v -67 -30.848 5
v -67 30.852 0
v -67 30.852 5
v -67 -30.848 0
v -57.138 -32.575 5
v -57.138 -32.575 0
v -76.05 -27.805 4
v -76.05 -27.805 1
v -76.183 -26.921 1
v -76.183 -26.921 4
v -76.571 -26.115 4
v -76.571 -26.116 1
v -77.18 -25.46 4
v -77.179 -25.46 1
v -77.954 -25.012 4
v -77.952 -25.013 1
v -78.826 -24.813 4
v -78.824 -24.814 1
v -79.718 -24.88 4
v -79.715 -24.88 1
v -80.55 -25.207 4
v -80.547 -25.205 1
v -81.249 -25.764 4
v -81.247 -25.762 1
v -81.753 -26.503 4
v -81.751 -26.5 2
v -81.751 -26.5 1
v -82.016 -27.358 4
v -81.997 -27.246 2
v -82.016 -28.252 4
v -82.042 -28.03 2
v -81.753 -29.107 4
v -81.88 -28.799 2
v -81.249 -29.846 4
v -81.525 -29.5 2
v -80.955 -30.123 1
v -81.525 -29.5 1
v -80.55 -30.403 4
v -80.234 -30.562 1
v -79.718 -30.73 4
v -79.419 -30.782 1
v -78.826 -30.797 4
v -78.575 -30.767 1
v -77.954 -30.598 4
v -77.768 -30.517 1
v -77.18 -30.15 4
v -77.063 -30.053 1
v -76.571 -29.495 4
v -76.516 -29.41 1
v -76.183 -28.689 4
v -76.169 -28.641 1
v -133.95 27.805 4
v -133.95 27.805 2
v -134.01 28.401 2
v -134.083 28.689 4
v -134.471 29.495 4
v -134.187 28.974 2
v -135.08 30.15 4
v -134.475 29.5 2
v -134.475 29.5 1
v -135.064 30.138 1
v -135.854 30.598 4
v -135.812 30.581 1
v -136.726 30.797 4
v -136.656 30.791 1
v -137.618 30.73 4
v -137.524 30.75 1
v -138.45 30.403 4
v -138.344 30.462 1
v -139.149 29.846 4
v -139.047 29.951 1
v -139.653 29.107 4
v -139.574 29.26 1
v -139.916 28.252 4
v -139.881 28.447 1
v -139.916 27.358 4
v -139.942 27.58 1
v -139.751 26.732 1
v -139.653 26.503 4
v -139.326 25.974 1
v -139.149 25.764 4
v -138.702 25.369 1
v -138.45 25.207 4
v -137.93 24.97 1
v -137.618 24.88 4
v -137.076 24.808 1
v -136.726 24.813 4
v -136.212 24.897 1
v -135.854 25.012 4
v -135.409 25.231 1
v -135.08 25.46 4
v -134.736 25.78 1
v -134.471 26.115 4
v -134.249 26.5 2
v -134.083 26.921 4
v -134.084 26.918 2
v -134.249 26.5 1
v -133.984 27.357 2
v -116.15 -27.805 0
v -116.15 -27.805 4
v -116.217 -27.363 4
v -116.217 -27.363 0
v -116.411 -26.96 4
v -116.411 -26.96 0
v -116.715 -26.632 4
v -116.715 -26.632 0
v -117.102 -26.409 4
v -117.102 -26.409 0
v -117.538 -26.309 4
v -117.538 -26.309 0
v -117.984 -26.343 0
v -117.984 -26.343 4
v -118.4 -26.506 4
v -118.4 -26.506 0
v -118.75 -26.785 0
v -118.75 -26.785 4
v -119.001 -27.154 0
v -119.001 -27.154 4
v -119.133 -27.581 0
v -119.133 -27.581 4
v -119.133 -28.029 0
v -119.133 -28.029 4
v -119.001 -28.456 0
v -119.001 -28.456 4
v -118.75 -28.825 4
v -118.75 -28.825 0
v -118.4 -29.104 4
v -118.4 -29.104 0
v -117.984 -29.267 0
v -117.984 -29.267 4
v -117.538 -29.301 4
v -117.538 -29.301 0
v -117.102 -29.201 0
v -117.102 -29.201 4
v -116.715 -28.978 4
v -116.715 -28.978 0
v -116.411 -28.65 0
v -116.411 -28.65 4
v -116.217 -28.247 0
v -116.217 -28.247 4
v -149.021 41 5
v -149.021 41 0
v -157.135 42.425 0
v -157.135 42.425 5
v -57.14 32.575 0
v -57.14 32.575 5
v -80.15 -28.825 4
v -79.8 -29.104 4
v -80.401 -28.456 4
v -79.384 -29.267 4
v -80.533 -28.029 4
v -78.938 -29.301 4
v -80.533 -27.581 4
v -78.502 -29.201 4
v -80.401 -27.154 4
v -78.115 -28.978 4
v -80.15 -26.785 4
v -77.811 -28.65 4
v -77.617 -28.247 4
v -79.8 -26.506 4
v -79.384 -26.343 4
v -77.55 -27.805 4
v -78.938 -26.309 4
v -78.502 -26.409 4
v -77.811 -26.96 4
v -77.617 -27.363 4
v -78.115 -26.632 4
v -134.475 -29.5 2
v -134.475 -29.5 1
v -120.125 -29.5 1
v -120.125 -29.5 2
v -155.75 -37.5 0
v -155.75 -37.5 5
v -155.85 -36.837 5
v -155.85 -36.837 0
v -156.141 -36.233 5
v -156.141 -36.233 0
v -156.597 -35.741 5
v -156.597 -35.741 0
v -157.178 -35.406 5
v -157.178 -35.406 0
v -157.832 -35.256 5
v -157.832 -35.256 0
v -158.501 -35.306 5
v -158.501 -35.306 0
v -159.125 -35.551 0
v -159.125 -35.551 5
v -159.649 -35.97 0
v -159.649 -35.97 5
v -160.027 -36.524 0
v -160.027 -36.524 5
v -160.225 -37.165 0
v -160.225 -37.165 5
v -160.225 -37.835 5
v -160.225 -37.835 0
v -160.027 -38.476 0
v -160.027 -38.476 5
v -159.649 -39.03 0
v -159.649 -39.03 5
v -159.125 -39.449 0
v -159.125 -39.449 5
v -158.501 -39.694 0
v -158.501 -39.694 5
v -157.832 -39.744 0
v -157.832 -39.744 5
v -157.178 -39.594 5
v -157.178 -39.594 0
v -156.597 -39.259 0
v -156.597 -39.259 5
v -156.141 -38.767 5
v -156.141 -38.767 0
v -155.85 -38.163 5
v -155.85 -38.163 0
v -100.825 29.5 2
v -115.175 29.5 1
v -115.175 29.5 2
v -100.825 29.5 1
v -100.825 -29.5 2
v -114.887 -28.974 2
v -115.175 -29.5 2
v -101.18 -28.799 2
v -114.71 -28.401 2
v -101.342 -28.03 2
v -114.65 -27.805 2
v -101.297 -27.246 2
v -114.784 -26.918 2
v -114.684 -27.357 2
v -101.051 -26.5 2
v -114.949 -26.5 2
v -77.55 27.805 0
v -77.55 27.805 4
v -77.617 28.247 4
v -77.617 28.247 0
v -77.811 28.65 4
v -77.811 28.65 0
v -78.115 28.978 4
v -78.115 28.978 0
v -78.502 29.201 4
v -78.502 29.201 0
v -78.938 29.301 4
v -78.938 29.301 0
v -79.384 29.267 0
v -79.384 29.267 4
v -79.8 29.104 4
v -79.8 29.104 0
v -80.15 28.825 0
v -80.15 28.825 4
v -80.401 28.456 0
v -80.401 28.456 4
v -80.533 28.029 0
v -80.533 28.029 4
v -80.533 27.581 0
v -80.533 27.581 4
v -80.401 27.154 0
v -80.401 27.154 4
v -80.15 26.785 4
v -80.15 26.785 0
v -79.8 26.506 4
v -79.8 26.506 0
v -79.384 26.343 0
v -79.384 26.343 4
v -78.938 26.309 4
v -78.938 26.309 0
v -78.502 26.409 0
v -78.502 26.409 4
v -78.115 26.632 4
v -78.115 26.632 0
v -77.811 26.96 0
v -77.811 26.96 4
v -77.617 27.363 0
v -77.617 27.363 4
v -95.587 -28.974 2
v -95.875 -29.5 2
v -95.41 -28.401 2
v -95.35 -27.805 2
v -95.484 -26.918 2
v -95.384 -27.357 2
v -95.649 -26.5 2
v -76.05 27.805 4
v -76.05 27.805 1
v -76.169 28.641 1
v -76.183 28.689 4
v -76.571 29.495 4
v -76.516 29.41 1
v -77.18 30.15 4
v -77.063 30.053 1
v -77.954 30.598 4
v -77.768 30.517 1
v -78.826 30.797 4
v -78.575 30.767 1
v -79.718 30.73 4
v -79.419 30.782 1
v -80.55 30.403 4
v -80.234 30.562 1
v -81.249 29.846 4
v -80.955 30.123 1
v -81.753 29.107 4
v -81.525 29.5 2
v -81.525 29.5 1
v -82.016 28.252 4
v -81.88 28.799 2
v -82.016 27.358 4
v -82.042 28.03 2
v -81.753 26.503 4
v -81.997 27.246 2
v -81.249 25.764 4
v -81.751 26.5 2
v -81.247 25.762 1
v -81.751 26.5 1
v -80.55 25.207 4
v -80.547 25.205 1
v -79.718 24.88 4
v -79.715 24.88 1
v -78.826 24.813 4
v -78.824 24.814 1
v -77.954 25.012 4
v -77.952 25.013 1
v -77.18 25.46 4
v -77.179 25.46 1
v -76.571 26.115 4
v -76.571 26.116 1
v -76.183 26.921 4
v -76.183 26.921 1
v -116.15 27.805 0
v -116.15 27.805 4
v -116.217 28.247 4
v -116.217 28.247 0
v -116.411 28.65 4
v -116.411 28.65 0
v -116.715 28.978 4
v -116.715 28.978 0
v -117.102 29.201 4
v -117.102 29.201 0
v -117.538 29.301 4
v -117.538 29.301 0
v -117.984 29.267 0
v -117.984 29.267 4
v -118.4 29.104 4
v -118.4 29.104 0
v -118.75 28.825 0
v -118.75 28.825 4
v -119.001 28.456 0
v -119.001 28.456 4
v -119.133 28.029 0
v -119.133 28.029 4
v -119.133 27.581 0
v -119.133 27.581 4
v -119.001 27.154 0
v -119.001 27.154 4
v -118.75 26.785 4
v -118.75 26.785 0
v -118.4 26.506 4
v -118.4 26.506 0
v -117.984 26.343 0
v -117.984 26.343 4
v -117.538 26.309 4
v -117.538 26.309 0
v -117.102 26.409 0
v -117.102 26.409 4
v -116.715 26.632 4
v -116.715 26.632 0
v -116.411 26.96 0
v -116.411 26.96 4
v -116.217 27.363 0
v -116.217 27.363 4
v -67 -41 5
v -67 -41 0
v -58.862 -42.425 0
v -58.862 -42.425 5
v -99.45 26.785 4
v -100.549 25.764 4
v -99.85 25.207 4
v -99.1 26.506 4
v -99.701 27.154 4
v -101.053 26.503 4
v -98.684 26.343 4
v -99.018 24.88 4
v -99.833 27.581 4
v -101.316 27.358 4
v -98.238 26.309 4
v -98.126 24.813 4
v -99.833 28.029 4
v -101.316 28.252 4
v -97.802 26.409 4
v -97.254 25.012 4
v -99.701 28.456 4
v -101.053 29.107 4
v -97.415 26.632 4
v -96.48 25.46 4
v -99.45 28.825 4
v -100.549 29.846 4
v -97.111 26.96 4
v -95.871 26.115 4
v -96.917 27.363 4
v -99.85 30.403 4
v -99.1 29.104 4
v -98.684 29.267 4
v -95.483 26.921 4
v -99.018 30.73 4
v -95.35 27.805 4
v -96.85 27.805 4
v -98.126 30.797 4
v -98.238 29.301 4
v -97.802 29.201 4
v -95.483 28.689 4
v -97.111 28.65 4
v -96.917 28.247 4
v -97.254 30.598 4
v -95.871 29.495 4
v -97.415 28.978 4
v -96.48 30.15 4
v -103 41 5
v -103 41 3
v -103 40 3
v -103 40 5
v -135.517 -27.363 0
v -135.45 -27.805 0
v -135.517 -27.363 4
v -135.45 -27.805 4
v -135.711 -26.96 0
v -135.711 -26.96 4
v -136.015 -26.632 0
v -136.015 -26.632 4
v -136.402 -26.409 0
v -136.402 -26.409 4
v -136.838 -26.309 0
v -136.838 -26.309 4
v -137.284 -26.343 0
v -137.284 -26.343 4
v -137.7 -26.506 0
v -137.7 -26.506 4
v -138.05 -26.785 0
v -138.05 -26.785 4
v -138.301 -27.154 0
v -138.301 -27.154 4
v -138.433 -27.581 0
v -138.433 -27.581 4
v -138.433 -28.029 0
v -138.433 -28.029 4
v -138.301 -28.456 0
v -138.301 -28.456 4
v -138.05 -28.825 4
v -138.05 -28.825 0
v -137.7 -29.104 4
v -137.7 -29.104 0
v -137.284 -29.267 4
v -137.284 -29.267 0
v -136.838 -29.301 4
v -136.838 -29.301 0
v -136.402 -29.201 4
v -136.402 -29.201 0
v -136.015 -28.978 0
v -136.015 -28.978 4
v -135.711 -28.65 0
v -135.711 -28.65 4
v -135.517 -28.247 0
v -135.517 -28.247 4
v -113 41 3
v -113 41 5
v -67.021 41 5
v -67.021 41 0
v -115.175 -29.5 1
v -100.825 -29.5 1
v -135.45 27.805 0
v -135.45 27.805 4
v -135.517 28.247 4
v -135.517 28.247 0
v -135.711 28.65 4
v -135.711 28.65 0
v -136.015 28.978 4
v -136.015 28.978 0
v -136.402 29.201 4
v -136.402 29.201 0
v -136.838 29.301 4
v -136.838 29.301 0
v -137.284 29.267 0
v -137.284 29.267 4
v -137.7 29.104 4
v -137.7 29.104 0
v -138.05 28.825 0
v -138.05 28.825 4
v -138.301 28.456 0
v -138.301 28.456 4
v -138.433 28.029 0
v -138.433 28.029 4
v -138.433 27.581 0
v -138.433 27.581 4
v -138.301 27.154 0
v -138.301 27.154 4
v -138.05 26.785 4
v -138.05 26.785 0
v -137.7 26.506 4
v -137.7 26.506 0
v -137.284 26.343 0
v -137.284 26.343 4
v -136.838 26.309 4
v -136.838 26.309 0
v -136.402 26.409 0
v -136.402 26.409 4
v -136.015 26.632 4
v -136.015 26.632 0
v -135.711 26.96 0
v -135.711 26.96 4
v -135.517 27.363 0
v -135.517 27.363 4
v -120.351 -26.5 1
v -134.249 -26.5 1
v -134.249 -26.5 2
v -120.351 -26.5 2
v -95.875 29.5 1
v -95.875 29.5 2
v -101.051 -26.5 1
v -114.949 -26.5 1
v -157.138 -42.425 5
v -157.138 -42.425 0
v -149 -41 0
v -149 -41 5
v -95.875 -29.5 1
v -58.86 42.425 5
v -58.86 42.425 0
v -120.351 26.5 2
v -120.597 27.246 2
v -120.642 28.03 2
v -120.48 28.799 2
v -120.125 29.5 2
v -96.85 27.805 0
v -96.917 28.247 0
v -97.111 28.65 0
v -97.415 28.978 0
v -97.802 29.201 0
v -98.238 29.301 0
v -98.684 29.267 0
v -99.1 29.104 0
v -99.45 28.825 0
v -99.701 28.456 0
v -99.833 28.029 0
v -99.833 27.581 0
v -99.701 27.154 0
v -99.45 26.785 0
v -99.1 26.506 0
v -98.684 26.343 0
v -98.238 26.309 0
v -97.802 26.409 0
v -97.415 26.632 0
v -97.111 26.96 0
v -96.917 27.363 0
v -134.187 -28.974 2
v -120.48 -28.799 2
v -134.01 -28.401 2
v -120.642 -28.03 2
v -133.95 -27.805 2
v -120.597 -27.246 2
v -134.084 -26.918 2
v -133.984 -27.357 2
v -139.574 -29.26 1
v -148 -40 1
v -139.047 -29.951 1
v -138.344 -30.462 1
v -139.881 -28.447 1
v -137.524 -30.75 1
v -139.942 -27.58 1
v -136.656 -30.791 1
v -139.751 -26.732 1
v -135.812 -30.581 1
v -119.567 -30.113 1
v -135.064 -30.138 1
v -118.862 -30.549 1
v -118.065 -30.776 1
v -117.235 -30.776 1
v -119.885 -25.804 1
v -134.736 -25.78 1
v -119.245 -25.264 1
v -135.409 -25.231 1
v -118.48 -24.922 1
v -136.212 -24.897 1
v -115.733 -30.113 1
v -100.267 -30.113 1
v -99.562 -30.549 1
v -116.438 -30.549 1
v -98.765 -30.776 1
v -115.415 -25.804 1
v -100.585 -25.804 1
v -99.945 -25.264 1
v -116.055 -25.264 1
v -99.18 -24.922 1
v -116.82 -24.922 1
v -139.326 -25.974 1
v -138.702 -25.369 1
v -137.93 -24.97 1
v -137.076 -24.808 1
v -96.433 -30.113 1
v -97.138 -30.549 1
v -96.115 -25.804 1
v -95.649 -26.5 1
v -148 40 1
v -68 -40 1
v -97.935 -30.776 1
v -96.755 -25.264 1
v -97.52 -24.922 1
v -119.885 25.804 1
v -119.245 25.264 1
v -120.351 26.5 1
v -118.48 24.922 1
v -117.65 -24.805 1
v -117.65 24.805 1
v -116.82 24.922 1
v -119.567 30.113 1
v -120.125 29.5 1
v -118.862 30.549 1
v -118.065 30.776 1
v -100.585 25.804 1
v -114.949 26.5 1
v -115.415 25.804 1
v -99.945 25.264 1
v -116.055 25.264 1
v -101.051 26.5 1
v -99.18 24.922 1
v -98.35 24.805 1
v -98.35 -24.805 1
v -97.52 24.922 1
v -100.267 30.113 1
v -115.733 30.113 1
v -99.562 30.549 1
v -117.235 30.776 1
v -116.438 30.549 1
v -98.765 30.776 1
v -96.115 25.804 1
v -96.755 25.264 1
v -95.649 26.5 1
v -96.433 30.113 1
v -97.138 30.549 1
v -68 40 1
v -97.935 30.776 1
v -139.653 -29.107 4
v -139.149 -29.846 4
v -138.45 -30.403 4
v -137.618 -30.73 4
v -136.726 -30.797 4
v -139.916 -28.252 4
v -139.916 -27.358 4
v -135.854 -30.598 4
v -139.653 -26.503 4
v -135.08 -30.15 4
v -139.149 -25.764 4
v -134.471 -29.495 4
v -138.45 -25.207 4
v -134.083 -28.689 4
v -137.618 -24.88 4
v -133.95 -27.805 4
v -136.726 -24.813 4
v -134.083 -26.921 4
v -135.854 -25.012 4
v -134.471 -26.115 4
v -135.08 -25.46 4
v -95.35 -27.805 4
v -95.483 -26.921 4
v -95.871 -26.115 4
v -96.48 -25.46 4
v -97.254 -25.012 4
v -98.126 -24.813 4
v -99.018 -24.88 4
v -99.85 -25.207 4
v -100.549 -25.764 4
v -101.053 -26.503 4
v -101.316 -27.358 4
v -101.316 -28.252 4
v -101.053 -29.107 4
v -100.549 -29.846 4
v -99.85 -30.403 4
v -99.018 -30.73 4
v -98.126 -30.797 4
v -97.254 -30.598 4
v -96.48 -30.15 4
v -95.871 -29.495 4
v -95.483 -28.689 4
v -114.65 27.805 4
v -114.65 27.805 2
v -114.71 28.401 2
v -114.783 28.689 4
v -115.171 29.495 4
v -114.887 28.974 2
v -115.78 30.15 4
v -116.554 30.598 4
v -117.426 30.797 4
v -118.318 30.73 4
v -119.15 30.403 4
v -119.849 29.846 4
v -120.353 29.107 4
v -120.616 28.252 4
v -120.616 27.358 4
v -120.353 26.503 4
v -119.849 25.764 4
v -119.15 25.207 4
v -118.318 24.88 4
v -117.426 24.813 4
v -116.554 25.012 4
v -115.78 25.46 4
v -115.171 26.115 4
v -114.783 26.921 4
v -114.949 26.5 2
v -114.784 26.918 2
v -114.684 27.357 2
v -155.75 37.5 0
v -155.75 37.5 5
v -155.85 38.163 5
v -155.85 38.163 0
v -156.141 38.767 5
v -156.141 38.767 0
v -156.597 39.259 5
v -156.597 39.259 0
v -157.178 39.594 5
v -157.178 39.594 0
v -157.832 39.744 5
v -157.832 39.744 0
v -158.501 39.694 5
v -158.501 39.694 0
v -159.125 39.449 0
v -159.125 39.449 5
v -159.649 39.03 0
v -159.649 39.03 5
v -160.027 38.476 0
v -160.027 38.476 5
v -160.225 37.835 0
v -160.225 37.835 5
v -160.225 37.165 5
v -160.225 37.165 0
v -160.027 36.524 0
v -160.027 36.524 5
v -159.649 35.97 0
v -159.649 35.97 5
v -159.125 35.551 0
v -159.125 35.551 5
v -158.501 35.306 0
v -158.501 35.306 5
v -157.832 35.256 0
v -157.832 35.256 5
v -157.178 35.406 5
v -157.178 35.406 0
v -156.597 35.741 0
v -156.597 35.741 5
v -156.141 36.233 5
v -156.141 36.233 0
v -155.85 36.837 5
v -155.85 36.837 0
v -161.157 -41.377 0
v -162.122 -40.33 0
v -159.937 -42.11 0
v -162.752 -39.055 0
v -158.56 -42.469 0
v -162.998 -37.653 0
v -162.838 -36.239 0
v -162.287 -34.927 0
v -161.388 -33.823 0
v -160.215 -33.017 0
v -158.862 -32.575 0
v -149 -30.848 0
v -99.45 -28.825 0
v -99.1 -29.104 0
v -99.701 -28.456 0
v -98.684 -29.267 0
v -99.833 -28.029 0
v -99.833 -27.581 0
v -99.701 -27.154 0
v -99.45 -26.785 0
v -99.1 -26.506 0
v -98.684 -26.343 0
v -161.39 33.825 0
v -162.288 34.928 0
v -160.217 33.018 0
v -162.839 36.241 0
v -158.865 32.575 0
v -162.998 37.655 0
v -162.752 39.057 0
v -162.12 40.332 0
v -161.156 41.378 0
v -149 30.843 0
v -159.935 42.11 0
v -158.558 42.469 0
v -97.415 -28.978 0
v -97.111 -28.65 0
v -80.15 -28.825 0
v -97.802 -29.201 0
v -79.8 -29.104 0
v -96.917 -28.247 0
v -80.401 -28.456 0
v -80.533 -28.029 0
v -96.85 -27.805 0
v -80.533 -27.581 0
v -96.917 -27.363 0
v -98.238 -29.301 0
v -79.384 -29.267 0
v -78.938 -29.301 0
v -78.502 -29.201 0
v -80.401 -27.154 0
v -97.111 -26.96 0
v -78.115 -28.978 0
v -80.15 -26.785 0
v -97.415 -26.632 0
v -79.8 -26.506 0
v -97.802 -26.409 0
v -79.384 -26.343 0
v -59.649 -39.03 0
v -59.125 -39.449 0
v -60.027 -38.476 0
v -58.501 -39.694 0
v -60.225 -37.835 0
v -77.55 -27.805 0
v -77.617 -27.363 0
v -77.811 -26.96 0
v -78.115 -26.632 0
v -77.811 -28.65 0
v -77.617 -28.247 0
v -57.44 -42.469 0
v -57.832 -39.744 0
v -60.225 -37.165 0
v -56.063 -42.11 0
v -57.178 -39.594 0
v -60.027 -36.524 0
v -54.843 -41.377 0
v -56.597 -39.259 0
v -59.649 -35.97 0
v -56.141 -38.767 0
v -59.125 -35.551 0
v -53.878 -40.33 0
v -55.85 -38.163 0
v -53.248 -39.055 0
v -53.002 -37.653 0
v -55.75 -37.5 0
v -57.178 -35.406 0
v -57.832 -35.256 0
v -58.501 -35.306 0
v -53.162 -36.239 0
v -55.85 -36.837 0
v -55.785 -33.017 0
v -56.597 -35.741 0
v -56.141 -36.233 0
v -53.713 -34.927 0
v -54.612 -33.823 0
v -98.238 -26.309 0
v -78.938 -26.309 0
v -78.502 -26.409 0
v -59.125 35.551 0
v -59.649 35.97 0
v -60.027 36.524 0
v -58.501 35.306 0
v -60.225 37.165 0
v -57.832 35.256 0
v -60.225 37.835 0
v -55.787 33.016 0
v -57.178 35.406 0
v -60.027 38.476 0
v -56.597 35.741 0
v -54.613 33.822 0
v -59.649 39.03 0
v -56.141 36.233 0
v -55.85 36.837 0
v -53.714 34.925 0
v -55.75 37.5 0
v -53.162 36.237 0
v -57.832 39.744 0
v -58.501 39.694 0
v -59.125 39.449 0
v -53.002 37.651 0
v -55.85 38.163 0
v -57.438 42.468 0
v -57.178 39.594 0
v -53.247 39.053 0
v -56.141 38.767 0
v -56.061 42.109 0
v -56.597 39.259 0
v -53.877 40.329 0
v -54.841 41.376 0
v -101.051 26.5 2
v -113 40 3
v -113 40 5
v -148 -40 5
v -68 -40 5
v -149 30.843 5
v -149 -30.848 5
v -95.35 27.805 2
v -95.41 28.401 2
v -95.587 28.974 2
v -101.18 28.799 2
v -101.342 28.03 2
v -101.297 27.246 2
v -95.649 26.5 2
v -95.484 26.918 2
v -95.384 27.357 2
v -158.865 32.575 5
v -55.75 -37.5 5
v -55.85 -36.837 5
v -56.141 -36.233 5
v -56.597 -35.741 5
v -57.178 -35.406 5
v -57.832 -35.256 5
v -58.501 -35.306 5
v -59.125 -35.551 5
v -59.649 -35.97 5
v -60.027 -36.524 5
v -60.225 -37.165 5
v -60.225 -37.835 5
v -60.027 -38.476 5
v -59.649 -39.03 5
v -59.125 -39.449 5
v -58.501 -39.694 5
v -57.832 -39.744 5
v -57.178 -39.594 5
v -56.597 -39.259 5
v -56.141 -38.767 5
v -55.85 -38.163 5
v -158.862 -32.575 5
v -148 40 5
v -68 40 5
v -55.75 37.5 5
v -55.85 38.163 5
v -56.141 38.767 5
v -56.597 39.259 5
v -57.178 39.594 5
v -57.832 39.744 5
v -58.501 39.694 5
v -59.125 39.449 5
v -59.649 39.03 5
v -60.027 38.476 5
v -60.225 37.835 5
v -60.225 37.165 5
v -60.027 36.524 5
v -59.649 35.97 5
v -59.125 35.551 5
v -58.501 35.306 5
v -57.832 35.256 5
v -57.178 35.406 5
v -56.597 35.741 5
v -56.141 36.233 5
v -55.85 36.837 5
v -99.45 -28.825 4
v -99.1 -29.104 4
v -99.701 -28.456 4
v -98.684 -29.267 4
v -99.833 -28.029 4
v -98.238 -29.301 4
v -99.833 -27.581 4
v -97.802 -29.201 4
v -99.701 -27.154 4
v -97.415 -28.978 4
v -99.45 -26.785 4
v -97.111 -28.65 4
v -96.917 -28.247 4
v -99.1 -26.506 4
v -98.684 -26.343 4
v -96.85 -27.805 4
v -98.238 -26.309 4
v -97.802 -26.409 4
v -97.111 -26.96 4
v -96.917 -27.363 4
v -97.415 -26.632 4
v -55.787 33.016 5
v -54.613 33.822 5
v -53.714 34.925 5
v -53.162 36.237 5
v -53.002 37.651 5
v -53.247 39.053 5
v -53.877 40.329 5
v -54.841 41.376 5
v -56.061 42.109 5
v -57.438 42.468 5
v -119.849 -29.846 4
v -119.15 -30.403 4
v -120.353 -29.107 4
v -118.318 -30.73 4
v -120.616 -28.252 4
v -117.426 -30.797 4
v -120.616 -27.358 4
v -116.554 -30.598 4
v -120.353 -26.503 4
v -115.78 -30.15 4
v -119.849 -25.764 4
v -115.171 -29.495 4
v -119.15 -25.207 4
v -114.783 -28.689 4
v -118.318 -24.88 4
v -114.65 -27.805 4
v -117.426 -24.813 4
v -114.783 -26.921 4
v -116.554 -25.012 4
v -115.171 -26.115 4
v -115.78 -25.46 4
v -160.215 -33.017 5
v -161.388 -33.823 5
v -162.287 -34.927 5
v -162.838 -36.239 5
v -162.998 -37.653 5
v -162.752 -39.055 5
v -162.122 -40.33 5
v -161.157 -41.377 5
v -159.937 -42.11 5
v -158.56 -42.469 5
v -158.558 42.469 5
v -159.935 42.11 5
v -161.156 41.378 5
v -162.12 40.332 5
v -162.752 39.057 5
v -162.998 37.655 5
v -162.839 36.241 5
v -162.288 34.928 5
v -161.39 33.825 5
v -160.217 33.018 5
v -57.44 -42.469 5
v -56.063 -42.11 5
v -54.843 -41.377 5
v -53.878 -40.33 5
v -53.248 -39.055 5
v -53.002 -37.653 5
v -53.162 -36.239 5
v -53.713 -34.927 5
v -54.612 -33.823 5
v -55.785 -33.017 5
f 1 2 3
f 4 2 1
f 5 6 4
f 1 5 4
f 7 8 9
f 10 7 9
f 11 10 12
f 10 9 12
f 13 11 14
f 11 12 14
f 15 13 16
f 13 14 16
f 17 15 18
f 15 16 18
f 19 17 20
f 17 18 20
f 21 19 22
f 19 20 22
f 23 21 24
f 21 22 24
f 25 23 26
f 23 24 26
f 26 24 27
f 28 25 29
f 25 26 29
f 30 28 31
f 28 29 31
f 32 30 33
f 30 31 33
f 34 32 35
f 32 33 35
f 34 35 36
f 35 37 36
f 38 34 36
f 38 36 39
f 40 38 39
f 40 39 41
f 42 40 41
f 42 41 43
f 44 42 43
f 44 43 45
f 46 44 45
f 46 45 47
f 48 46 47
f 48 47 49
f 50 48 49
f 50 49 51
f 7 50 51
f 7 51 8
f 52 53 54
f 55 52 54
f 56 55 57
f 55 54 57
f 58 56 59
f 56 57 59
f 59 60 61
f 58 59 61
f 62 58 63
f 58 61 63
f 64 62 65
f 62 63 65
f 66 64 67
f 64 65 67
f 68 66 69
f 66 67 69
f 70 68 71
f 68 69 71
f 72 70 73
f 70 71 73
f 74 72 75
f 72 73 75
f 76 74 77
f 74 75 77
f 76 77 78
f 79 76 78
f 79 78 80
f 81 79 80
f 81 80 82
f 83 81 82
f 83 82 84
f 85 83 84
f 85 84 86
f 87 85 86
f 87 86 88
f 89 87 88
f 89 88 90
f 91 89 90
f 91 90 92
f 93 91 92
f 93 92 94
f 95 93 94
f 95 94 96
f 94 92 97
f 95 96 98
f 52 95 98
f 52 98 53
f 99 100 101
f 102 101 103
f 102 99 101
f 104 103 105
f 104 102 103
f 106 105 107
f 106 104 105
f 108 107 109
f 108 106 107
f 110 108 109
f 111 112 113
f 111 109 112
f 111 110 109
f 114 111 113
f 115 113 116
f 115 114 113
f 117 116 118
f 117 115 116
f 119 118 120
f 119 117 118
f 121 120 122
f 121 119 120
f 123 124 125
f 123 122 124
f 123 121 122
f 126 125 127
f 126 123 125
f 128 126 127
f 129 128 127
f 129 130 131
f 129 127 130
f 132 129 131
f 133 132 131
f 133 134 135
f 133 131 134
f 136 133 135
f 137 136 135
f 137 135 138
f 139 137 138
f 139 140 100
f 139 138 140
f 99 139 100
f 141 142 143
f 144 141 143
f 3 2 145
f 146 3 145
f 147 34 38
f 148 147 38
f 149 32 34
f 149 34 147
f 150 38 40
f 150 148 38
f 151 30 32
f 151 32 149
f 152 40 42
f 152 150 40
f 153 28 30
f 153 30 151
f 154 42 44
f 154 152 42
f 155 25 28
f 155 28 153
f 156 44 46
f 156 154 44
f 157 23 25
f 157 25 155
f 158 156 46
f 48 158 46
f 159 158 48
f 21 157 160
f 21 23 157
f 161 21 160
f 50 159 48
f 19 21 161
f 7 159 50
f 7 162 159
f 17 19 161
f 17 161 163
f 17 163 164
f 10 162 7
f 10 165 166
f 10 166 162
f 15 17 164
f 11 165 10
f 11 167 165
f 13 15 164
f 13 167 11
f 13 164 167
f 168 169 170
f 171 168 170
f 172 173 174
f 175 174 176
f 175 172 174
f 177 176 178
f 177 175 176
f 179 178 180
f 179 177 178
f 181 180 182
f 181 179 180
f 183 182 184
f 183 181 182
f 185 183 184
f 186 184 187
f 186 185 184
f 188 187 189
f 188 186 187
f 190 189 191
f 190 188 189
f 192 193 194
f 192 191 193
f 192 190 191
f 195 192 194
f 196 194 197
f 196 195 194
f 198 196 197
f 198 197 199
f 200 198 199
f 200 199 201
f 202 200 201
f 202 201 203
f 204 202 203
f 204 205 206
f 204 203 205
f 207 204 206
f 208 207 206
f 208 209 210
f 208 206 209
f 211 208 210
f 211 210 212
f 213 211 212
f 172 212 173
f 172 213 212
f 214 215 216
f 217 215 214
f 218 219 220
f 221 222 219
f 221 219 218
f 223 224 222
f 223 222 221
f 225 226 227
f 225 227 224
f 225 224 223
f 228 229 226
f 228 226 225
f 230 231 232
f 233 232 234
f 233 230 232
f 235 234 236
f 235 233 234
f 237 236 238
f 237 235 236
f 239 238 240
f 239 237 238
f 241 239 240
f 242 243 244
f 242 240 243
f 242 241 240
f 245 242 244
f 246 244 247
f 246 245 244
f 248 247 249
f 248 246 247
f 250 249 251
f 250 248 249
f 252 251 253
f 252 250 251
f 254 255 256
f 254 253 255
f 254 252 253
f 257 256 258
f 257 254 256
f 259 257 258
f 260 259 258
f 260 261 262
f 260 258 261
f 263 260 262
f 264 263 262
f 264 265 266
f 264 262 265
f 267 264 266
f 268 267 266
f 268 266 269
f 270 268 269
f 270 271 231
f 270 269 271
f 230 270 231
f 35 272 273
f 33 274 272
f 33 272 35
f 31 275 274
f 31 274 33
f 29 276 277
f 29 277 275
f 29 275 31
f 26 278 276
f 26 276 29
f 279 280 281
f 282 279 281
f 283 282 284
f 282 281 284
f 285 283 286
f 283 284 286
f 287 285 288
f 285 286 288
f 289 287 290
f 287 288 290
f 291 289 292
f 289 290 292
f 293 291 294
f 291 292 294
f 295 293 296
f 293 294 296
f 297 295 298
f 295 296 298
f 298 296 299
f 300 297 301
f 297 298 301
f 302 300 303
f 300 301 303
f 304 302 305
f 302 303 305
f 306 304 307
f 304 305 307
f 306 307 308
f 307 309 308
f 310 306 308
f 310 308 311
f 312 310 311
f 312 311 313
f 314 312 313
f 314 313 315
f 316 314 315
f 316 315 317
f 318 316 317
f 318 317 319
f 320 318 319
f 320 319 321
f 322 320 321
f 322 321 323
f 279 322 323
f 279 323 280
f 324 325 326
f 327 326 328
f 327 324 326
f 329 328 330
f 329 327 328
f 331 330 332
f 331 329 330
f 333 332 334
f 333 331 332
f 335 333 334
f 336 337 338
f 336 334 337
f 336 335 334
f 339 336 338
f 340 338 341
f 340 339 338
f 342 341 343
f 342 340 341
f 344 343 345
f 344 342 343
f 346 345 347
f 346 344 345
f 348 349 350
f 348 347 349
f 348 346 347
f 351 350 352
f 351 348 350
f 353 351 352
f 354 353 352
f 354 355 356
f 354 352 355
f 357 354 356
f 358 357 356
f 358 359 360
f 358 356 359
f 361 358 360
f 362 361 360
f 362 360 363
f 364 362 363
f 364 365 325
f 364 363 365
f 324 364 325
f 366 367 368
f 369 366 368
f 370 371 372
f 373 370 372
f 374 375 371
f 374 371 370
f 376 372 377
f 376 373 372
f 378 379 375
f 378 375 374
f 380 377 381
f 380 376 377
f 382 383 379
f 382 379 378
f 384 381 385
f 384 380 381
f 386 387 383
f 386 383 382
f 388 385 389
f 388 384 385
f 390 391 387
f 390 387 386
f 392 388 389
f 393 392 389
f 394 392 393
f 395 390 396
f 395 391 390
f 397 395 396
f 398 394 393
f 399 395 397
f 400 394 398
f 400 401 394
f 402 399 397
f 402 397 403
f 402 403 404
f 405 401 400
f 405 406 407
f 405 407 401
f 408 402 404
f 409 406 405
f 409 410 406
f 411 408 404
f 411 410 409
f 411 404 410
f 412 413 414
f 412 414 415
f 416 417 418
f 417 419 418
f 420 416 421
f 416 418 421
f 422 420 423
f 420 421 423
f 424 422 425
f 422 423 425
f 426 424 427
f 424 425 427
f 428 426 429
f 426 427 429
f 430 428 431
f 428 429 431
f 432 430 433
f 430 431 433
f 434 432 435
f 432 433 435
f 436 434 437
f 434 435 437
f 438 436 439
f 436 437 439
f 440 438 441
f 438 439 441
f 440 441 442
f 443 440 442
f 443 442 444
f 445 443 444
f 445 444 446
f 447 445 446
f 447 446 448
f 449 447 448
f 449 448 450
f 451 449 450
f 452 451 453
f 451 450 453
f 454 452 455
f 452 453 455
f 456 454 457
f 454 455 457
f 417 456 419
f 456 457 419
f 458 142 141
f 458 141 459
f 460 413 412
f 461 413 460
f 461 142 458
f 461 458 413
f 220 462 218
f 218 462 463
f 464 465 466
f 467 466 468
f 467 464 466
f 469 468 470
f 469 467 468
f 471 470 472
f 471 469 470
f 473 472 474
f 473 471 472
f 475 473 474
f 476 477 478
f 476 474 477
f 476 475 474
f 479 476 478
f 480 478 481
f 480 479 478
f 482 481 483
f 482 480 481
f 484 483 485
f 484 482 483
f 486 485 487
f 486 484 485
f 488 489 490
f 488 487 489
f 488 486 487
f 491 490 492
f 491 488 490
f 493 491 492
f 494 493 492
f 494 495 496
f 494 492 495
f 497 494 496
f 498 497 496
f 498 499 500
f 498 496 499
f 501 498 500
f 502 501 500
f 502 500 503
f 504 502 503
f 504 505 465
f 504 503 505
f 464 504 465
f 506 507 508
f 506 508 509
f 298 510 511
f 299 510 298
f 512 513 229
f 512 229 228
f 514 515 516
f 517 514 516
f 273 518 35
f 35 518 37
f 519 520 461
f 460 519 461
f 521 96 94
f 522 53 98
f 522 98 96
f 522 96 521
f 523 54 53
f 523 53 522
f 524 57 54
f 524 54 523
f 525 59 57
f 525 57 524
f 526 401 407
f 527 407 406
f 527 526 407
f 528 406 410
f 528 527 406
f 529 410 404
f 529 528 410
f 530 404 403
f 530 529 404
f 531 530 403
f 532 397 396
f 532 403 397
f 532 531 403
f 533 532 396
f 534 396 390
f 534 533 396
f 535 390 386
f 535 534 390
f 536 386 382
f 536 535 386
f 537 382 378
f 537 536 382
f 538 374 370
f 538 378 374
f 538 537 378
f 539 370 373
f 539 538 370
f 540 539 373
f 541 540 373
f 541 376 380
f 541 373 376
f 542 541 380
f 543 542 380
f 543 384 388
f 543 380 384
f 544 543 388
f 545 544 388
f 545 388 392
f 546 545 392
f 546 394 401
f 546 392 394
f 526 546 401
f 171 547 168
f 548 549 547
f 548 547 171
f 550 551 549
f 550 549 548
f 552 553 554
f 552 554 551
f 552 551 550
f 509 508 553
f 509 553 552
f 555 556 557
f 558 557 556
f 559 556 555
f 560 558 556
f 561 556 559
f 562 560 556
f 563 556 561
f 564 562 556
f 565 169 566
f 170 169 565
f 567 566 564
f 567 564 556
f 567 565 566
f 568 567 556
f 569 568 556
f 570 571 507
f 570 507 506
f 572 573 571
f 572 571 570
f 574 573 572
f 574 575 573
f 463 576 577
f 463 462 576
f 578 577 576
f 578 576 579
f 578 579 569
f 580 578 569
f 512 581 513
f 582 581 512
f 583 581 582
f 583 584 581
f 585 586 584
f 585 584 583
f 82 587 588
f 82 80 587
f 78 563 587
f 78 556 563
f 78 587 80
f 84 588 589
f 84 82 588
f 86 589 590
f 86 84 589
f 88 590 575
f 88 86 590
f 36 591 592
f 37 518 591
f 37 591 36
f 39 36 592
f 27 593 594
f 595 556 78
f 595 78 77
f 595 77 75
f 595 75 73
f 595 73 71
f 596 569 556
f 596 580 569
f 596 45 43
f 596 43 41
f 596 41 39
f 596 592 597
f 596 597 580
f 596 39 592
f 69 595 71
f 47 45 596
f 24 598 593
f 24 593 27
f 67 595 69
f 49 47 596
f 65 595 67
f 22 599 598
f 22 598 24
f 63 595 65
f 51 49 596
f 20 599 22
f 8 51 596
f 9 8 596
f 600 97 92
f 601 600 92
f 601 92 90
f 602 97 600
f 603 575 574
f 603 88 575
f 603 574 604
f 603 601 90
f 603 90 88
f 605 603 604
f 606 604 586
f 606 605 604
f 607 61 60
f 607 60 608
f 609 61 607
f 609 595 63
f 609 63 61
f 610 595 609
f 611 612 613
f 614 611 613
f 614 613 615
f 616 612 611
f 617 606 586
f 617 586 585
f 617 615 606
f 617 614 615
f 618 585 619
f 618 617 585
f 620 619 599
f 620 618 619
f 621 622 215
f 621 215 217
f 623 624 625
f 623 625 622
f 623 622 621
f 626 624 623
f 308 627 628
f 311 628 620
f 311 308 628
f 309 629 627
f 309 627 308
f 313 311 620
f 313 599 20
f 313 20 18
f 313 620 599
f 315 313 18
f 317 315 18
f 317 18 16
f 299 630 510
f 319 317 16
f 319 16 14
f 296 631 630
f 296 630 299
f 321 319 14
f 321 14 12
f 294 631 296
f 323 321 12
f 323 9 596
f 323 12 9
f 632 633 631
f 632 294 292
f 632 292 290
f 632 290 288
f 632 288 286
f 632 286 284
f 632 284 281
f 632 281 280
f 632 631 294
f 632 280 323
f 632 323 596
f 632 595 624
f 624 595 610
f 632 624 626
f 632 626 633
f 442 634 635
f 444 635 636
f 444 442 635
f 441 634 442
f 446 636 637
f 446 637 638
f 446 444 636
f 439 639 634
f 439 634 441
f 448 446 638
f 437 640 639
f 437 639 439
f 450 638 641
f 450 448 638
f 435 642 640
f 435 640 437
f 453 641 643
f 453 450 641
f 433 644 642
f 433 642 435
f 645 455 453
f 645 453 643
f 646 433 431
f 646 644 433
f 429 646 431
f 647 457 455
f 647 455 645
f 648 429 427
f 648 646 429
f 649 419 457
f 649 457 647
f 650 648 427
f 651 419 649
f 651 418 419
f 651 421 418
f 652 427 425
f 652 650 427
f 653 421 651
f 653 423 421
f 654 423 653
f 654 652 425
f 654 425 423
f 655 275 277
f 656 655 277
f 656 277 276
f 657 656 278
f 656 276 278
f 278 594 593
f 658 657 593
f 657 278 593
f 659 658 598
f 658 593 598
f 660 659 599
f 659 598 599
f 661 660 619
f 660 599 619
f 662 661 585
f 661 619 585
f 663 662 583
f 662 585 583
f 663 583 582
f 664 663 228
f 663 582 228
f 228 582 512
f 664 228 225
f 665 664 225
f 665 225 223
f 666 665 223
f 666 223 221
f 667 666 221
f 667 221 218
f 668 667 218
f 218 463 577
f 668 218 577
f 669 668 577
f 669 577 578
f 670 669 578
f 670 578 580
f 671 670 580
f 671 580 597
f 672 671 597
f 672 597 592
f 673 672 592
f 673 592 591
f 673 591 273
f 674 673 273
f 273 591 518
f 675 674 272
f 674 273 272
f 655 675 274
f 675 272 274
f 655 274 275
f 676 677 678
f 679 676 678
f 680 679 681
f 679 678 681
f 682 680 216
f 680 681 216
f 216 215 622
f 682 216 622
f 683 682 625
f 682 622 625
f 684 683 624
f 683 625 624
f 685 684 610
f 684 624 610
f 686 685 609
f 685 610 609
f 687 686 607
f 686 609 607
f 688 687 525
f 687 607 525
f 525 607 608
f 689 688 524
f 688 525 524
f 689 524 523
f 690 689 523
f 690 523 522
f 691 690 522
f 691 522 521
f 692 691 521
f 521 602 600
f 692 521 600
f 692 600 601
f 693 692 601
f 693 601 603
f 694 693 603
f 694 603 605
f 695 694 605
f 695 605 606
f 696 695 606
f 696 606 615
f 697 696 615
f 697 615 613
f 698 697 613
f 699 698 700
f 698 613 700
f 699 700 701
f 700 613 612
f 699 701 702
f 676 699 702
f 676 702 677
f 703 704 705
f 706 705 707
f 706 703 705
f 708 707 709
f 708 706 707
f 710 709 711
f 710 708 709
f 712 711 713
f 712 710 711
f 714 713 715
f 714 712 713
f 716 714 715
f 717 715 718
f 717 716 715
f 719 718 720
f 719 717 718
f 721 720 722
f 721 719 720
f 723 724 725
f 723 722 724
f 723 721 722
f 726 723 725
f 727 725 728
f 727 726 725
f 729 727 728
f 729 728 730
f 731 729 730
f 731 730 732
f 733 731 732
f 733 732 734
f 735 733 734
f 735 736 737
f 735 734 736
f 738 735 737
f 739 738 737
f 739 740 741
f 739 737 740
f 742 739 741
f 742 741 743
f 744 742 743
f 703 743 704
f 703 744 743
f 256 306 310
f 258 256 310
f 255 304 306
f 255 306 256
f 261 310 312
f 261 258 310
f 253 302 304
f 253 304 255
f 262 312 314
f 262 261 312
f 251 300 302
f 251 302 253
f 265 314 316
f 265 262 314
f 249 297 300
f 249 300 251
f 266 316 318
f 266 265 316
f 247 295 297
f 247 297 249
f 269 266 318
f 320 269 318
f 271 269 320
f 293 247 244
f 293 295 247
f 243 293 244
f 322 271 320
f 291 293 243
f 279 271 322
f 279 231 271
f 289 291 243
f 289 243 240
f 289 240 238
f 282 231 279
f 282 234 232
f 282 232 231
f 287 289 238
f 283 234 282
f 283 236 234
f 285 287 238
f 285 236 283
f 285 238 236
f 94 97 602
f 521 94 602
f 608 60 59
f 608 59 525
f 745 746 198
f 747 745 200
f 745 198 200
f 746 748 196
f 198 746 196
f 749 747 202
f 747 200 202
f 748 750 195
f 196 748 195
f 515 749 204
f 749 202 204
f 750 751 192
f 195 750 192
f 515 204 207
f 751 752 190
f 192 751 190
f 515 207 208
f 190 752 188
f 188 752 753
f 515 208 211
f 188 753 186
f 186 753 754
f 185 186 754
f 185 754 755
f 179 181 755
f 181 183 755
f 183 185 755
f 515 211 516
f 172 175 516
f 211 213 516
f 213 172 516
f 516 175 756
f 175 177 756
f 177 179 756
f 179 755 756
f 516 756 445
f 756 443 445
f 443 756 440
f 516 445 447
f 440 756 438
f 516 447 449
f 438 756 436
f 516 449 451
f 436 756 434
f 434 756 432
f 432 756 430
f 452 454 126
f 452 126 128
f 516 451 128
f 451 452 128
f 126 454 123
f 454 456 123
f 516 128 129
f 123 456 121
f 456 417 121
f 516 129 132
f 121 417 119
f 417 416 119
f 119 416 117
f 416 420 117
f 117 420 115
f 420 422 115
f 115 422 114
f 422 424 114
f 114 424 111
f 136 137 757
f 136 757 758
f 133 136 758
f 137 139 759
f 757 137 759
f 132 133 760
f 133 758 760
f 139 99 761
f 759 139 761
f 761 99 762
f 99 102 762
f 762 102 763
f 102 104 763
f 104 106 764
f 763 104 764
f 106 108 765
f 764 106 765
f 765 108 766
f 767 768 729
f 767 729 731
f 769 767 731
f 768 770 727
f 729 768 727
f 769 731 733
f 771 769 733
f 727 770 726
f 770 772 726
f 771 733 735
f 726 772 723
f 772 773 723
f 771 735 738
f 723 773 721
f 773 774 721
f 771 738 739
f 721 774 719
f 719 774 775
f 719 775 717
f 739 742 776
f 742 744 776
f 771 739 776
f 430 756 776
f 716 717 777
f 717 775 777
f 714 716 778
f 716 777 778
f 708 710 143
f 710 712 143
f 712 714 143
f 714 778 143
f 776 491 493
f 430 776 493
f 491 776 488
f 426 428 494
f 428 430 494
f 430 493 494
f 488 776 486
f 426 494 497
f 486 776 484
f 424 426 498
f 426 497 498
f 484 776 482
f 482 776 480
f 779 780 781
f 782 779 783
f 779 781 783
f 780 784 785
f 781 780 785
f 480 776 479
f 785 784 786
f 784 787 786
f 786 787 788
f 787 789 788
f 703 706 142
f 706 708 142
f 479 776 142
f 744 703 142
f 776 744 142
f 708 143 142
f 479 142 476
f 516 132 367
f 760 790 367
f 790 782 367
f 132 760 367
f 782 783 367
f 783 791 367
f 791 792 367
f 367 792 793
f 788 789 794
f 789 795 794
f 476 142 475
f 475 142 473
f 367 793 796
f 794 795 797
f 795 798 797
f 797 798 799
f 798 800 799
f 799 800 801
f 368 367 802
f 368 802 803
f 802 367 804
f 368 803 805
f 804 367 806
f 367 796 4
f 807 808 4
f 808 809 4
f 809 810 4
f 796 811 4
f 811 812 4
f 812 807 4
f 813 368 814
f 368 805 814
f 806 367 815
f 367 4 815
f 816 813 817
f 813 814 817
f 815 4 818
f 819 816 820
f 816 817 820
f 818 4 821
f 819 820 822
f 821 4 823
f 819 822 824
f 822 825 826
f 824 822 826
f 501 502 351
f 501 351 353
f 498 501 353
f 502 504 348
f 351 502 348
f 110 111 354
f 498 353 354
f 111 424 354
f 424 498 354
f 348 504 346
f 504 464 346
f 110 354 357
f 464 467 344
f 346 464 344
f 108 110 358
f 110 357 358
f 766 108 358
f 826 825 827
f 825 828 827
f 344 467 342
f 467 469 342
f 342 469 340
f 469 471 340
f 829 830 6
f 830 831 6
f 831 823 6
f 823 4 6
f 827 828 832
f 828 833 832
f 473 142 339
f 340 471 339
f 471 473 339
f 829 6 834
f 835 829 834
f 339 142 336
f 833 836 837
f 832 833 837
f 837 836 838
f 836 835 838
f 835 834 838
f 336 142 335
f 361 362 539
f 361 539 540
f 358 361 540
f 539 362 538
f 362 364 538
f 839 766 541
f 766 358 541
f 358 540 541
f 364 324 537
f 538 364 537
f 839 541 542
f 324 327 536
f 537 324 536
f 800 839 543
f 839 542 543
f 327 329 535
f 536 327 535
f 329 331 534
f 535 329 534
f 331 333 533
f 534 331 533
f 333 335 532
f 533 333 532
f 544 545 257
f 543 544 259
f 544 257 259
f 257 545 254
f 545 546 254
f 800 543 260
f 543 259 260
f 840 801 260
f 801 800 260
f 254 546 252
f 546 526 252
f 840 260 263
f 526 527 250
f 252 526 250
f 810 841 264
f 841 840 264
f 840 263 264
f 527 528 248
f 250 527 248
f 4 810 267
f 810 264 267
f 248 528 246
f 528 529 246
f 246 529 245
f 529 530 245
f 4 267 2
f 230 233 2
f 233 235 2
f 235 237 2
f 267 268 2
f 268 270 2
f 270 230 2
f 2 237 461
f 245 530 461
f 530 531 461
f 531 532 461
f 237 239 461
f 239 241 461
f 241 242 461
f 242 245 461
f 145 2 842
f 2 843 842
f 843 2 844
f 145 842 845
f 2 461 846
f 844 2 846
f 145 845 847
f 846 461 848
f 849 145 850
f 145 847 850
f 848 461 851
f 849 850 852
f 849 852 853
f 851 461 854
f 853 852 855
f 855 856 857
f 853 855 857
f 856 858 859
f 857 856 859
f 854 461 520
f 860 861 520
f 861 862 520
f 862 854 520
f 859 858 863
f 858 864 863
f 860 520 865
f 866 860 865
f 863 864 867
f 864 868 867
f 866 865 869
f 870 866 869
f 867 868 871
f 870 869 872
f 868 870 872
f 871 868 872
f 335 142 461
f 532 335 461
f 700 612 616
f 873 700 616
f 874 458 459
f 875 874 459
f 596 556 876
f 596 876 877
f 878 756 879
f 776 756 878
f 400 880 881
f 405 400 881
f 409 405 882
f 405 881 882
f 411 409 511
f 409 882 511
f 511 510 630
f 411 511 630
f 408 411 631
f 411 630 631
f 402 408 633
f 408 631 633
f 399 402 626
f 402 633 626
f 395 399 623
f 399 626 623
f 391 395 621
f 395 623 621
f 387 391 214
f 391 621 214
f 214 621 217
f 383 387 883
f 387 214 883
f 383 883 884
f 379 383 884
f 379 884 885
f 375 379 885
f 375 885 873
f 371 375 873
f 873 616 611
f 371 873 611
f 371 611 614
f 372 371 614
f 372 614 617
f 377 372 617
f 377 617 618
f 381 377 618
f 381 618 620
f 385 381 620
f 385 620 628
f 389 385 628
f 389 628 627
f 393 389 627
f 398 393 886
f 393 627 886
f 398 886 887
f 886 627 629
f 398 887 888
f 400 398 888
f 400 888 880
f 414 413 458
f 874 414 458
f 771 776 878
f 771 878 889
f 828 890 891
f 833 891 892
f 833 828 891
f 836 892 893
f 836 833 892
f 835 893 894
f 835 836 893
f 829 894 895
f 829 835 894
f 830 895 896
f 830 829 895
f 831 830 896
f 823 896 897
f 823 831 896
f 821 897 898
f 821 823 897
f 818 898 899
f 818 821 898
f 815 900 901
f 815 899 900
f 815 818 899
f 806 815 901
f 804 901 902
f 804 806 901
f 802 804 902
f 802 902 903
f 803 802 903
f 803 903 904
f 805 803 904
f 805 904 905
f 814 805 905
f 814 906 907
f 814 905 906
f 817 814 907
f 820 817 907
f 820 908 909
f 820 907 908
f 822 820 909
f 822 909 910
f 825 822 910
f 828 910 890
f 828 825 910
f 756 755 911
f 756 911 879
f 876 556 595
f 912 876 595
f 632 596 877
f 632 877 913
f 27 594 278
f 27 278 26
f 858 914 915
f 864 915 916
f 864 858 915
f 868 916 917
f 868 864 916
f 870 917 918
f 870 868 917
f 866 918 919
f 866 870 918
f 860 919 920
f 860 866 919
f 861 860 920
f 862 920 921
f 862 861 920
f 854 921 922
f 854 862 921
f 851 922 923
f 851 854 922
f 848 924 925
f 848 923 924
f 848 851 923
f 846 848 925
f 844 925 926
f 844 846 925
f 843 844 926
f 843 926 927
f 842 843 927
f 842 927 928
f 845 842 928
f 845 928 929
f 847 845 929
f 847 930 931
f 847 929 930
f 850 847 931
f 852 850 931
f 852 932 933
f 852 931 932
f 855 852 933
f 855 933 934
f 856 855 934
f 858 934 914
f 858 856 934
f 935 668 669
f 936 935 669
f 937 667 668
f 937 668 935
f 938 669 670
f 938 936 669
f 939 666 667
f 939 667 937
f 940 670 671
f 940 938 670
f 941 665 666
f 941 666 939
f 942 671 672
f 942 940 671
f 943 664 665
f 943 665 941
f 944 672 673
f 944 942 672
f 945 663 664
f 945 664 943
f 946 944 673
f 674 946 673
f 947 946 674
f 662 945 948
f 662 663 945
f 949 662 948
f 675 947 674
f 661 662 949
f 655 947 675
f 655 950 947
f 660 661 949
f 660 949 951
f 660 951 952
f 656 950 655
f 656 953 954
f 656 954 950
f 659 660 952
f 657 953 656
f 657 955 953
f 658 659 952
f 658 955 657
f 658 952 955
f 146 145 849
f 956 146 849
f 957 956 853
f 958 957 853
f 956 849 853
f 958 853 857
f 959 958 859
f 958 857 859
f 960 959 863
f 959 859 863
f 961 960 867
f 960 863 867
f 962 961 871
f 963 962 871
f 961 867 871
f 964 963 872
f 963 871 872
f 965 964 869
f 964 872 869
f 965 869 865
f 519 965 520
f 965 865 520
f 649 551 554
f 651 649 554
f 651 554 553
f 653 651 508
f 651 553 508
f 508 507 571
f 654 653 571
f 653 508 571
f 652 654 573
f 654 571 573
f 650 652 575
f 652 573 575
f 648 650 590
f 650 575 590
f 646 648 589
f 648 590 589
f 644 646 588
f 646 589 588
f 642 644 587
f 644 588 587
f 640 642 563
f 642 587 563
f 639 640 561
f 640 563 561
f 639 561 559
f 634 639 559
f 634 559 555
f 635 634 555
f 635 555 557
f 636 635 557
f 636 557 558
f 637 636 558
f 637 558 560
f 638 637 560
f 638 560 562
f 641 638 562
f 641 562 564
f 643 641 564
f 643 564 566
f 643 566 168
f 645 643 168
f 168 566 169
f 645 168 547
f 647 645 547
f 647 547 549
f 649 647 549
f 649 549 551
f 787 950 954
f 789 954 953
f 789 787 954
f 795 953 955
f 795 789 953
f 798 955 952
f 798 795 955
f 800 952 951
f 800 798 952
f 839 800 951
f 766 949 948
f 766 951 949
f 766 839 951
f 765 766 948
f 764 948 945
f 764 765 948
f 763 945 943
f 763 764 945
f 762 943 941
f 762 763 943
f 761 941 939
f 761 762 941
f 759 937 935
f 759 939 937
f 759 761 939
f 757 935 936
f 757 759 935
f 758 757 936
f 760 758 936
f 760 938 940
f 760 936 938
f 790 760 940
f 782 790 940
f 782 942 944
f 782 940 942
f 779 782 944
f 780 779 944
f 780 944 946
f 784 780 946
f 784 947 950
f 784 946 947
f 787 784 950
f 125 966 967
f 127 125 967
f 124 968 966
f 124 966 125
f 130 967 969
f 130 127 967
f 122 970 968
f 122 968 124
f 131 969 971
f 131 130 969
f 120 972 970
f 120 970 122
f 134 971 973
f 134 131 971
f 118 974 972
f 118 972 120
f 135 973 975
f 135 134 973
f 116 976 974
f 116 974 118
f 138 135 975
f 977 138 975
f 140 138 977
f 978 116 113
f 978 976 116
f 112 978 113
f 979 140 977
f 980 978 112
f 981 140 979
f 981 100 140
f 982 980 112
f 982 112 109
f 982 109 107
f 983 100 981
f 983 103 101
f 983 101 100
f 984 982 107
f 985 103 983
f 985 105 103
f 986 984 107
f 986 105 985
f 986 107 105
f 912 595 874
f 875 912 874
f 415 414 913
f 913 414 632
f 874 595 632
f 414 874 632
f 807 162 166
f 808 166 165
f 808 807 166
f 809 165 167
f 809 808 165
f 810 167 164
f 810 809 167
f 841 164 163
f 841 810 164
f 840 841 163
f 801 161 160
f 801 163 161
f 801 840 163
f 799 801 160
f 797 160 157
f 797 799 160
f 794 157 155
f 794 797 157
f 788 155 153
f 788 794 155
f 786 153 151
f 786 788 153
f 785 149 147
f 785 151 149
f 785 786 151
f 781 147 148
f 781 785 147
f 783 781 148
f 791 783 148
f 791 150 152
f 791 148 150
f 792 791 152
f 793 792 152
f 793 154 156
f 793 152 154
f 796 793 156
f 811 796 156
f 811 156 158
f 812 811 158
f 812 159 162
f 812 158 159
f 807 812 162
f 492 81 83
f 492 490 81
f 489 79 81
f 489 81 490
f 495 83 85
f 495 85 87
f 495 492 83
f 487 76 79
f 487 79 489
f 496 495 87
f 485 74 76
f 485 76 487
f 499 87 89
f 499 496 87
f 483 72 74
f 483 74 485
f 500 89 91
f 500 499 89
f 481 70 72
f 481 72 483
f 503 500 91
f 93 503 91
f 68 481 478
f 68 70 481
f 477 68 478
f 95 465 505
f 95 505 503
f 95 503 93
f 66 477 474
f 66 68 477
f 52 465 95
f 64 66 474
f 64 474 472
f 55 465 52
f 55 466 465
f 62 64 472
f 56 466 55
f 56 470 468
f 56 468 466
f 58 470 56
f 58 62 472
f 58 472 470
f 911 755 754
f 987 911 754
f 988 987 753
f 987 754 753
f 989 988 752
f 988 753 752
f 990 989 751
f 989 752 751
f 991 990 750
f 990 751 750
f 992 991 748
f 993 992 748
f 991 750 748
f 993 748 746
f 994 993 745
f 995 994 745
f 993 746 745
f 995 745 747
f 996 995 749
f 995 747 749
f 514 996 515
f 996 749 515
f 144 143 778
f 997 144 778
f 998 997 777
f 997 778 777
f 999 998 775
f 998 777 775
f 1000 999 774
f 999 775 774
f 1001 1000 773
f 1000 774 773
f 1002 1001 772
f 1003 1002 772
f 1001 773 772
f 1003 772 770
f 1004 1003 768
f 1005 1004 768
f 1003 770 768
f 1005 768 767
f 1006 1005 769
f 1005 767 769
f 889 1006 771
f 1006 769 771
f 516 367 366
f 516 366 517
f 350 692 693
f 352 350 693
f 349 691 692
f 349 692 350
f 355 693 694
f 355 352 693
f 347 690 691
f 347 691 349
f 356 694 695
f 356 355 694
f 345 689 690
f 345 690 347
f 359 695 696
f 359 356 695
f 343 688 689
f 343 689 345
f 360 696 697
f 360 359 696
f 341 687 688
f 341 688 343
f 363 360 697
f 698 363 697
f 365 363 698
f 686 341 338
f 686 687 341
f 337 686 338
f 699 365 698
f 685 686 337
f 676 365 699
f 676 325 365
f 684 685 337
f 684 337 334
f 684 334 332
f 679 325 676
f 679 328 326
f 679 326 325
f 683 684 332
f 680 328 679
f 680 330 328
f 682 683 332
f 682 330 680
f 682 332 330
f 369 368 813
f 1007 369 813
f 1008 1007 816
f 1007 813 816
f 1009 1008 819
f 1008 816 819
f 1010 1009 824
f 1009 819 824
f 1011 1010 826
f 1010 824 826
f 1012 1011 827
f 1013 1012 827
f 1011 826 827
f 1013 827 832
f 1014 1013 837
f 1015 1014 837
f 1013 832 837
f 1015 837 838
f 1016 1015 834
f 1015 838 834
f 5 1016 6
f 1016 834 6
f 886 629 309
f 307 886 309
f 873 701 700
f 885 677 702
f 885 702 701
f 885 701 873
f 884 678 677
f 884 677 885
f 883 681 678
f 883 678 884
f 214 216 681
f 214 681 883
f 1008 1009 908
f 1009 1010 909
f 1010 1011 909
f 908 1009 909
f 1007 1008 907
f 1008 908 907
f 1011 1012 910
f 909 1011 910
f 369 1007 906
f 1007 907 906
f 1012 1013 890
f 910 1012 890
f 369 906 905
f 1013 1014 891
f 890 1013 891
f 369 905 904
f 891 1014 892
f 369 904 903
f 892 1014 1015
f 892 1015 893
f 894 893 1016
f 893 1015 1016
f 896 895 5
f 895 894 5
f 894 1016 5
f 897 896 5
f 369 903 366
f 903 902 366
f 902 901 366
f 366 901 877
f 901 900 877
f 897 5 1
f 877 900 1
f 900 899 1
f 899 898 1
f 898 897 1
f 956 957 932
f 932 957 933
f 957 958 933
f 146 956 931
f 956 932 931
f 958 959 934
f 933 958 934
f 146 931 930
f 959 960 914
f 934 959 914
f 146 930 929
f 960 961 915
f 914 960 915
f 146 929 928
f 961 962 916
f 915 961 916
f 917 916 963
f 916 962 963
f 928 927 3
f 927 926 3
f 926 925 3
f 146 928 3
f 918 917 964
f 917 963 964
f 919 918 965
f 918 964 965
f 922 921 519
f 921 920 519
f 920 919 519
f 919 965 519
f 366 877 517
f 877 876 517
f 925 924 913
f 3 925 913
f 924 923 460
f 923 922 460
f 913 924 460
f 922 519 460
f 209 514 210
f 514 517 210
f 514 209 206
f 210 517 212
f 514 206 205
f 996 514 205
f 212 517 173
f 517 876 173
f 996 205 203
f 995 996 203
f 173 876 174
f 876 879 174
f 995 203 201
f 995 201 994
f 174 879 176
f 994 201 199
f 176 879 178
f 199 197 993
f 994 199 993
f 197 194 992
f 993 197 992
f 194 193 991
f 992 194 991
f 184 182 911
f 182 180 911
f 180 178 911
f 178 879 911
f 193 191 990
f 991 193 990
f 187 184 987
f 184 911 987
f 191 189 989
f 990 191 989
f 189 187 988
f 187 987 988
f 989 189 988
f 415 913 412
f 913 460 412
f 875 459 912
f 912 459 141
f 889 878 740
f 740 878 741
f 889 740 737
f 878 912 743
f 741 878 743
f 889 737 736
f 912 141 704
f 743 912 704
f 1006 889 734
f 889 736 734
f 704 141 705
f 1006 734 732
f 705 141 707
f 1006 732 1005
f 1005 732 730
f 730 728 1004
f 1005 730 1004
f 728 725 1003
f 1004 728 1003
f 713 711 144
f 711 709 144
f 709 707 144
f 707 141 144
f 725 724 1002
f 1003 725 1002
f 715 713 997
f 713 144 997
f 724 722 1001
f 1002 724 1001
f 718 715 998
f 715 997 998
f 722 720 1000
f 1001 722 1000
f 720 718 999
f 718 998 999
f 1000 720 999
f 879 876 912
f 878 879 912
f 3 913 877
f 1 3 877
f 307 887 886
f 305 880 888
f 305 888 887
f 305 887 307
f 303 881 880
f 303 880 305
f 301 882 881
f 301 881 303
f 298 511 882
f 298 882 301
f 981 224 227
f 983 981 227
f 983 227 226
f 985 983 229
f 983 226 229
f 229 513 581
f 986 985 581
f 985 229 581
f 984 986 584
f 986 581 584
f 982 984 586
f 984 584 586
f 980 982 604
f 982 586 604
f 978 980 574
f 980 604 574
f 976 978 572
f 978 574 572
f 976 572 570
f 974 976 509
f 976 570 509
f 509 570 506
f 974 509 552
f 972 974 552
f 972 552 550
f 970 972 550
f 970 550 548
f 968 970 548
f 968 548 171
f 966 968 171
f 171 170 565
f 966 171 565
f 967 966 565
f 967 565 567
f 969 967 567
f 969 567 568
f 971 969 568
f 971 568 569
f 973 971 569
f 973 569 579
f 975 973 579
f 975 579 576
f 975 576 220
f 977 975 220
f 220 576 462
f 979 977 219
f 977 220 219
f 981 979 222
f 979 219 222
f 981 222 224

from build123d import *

# Parameters (mm, degrees)
SKETCH111_W     = 80
SKETCH111_H     = 80
PAD042_DEPTH    = 5
SKETCH112_W     = 82
SKETCH112_H     = 82
PAD043_DEPTH    = 1
SKETCH114_R     = 3
SKETCH114_R_2   = 1.375
PAD045_DEPTH    = 4
SKETCH215_W     = 16
SKETCH215_H     = 3
PAD095_DEPTH    = 2
SKETCH216_R     = 2.25
POCKET088_DEPTH = 10
SKETCH217_W     = 10
SKETCH217_H     = 2
POCKET089_DEPTH = 5
SKETCH255_R     = 1.5
POCKET103_DEPTH = 5


with BuildPart() as part:
    # Sketch111 → Pad042 (new body)
    with BuildSketch(Plane.XY):
        with BuildLine():
            Line((-41.02059, 41), (40.97941, 41))
            Line((49.139632, 42.42542), (40.97941, 41))
            ThreePointArc((50.860368, 32.57458), (54.92542, 38.360368), (49.139632, 42.42542))
            Line((41, 30.852179), (50.860368, 32.57458))
            Line((41, 30.852179), (41, -30.847821))
            Line((50.86248, -32.574949), (41, -30.847821))
            ThreePointArc((49.13752, -42.425051), (54.925051, -38.36248), (50.86248, -32.574949))
            Line((41, -41), (49.13752, -42.425051))
            Line((41, -41), (-41, -41))
            Line((-49.13752, -42.425051), (-41, -41))
            ThreePointArc((-50.86248, -32.574949), (-54.925051, -38.36248), (-49.13752, -42.425051))
            Line((-50.86248, -32.574949), (-41, -30.847821))
            Line((-41, -30.847821), (-41, 30.843439))
            Line((-41, 30.843439), (-50.864603, 32.575321))
            ThreePointArc((-49.135397, 42.424679), (-54.924679, 38.364603), (-50.864603, 32.575321))
            Line((-41.02059, 41), (-49.135397, 42.424679))
        make_face()
        Rectangle(SKETCH111_W, SKETCH111_H, mode=Mode.SUBTRACT)
    extrude(amount=PAD042_DEPTH)

    # Sketch112 → Pad043 (join)
    with BuildSketch(Plane.XY):
        Rectangle(SKETCH112_W, SKETCH112_H)
    extrude(amount=PAD043_DEPTH)

    # Sketch114 → Pad045 (join)
    with BuildSketch(Plane.XY):
        with Locations((-28.95, 27.805)):
            Circle(SKETCH114_R)
        with Locations((-28.95, 27.805)):
            Circle(SKETCH114_R_2, mode=Mode.SUBTRACT)
        with Locations((-9.65, 27.805)):
            Circle(SKETCH114_R)
        with Locations((-9.65, 27.805)):
            Circle(SKETCH114_R_2, mode=Mode.SUBTRACT)
        with Locations((9.65, 27.805)):
            Circle(SKETCH114_R)
        with Locations((9.65, 27.805)):
            Circle(SKETCH114_R_2, mode=Mode.SUBTRACT)
        with Locations((28.95, 27.805)):
            Circle(SKETCH114_R)
        with Locations((28.95, 27.805)):
            Circle(SKETCH114_R_2, mode=Mode.SUBTRACT)
        with Locations((28.95, -27.805)):
            Circle(SKETCH114_R)
        with Locations((28.95, -27.805)):
            Circle(SKETCH114_R_2, mode=Mode.SUBTRACT)
        with Locations((9.65, -27.805)):
            Circle(SKETCH114_R)
        with Locations((9.65, -27.805)):
            Circle(SKETCH114_R_2, mode=Mode.SUBTRACT)
        with Locations((-9.65, -27.805)):
            Circle(SKETCH114_R)
        with Locations((-9.65, -27.805)):
            Circle(SKETCH114_R_2, mode=Mode.SUBTRACT)
        with Locations((-28.95, -27.805)):
            Circle(SKETCH114_R)
        with Locations((-28.95, -27.805)):
            Circle(SKETCH114_R_2, mode=Mode.SUBTRACT)
    extrude(amount=PAD045_DEPTH)

    # Sketch215 → Pad095 (join)
    with BuildSketch(Plane.XY):
        with Locations((-20, 28)):
            Rectangle(SKETCH215_W, SKETCH215_H)
        with Locations((20, 28)):
            Rectangle(SKETCH215_W, SKETCH215_H)
        with Locations((-20, -28)):
            Rectangle(SKETCH215_W, SKETCH215_H)
        with Locations((20, -28)):
            Rectangle(SKETCH215_W, SKETCH215_H)
        with Locations((0, 28)):
            Rectangle(SKETCH215_W, SKETCH215_H)
        with Locations((0, -28)):
            Rectangle(SKETCH215_W, SKETCH215_H)
    extrude(amount=PAD095_DEPTH)

    # Sketch216 → Pocket088 (cut)
    with BuildSketch(Plane.XY):
        with Locations((-50, 37.5)):
            Circle(SKETCH216_R)
        with Locations((50, 37.5)):
            Circle(SKETCH216_R)
        with Locations((50, -37.5)):
            Circle(SKETCH216_R)
        with Locations((-50, -37.5)):
            Circle(SKETCH216_R)
    extrude(amount=POCKET088_DEPTH, mode=Mode.SUBTRACT)

    # Sketch217 (on Face1 of Pocket088) → Pocket089 (cut)
    with BuildSketch(Plane(origin=(0, 41, 0), x_dir=(-1, 0, 0), z_dir=(0, 1, 0))):
        with Locations((0, 4)):
            Rectangle(SKETCH217_W, SKETCH217_H)
    extrude(amount=-POCKET089_DEPTH, mode=Mode.SUBTRACT)

    # Sketch255 → Pocket103 (cut, symmetric)
    with BuildSketch(Plane.XY):
        with Locations((-9.65, 27.805)):
            Circle(SKETCH255_R)
        with Locations((9.65, 27.805)):
            Circle(SKETCH255_R)
        with Locations((-9.65, -27.805)):
            Circle(SKETCH255_R)
        with Locations((9.65, -27.805)):
            Circle(SKETCH255_R)
        with Locations((-28.95, 27.805)):
            Circle(SKETCH255_R)
        with Locations((28.95, 27.805)):
            Circle(SKETCH255_R)
        with Locations((28.95, -27.805)):
            Circle(SKETCH255_R)
        with Locations((-28.95, -27.805)):
            Circle(SKETCH255_R)
    extrude(amount=POCKET103_DEPTH, both=True, mode=Mode.SUBTRACT)


with BuildPart() as part_1:
    # Body013 placement: moved
    add(part.part.moved(Location((-108, 0, 0))))


solid = part_1.part
